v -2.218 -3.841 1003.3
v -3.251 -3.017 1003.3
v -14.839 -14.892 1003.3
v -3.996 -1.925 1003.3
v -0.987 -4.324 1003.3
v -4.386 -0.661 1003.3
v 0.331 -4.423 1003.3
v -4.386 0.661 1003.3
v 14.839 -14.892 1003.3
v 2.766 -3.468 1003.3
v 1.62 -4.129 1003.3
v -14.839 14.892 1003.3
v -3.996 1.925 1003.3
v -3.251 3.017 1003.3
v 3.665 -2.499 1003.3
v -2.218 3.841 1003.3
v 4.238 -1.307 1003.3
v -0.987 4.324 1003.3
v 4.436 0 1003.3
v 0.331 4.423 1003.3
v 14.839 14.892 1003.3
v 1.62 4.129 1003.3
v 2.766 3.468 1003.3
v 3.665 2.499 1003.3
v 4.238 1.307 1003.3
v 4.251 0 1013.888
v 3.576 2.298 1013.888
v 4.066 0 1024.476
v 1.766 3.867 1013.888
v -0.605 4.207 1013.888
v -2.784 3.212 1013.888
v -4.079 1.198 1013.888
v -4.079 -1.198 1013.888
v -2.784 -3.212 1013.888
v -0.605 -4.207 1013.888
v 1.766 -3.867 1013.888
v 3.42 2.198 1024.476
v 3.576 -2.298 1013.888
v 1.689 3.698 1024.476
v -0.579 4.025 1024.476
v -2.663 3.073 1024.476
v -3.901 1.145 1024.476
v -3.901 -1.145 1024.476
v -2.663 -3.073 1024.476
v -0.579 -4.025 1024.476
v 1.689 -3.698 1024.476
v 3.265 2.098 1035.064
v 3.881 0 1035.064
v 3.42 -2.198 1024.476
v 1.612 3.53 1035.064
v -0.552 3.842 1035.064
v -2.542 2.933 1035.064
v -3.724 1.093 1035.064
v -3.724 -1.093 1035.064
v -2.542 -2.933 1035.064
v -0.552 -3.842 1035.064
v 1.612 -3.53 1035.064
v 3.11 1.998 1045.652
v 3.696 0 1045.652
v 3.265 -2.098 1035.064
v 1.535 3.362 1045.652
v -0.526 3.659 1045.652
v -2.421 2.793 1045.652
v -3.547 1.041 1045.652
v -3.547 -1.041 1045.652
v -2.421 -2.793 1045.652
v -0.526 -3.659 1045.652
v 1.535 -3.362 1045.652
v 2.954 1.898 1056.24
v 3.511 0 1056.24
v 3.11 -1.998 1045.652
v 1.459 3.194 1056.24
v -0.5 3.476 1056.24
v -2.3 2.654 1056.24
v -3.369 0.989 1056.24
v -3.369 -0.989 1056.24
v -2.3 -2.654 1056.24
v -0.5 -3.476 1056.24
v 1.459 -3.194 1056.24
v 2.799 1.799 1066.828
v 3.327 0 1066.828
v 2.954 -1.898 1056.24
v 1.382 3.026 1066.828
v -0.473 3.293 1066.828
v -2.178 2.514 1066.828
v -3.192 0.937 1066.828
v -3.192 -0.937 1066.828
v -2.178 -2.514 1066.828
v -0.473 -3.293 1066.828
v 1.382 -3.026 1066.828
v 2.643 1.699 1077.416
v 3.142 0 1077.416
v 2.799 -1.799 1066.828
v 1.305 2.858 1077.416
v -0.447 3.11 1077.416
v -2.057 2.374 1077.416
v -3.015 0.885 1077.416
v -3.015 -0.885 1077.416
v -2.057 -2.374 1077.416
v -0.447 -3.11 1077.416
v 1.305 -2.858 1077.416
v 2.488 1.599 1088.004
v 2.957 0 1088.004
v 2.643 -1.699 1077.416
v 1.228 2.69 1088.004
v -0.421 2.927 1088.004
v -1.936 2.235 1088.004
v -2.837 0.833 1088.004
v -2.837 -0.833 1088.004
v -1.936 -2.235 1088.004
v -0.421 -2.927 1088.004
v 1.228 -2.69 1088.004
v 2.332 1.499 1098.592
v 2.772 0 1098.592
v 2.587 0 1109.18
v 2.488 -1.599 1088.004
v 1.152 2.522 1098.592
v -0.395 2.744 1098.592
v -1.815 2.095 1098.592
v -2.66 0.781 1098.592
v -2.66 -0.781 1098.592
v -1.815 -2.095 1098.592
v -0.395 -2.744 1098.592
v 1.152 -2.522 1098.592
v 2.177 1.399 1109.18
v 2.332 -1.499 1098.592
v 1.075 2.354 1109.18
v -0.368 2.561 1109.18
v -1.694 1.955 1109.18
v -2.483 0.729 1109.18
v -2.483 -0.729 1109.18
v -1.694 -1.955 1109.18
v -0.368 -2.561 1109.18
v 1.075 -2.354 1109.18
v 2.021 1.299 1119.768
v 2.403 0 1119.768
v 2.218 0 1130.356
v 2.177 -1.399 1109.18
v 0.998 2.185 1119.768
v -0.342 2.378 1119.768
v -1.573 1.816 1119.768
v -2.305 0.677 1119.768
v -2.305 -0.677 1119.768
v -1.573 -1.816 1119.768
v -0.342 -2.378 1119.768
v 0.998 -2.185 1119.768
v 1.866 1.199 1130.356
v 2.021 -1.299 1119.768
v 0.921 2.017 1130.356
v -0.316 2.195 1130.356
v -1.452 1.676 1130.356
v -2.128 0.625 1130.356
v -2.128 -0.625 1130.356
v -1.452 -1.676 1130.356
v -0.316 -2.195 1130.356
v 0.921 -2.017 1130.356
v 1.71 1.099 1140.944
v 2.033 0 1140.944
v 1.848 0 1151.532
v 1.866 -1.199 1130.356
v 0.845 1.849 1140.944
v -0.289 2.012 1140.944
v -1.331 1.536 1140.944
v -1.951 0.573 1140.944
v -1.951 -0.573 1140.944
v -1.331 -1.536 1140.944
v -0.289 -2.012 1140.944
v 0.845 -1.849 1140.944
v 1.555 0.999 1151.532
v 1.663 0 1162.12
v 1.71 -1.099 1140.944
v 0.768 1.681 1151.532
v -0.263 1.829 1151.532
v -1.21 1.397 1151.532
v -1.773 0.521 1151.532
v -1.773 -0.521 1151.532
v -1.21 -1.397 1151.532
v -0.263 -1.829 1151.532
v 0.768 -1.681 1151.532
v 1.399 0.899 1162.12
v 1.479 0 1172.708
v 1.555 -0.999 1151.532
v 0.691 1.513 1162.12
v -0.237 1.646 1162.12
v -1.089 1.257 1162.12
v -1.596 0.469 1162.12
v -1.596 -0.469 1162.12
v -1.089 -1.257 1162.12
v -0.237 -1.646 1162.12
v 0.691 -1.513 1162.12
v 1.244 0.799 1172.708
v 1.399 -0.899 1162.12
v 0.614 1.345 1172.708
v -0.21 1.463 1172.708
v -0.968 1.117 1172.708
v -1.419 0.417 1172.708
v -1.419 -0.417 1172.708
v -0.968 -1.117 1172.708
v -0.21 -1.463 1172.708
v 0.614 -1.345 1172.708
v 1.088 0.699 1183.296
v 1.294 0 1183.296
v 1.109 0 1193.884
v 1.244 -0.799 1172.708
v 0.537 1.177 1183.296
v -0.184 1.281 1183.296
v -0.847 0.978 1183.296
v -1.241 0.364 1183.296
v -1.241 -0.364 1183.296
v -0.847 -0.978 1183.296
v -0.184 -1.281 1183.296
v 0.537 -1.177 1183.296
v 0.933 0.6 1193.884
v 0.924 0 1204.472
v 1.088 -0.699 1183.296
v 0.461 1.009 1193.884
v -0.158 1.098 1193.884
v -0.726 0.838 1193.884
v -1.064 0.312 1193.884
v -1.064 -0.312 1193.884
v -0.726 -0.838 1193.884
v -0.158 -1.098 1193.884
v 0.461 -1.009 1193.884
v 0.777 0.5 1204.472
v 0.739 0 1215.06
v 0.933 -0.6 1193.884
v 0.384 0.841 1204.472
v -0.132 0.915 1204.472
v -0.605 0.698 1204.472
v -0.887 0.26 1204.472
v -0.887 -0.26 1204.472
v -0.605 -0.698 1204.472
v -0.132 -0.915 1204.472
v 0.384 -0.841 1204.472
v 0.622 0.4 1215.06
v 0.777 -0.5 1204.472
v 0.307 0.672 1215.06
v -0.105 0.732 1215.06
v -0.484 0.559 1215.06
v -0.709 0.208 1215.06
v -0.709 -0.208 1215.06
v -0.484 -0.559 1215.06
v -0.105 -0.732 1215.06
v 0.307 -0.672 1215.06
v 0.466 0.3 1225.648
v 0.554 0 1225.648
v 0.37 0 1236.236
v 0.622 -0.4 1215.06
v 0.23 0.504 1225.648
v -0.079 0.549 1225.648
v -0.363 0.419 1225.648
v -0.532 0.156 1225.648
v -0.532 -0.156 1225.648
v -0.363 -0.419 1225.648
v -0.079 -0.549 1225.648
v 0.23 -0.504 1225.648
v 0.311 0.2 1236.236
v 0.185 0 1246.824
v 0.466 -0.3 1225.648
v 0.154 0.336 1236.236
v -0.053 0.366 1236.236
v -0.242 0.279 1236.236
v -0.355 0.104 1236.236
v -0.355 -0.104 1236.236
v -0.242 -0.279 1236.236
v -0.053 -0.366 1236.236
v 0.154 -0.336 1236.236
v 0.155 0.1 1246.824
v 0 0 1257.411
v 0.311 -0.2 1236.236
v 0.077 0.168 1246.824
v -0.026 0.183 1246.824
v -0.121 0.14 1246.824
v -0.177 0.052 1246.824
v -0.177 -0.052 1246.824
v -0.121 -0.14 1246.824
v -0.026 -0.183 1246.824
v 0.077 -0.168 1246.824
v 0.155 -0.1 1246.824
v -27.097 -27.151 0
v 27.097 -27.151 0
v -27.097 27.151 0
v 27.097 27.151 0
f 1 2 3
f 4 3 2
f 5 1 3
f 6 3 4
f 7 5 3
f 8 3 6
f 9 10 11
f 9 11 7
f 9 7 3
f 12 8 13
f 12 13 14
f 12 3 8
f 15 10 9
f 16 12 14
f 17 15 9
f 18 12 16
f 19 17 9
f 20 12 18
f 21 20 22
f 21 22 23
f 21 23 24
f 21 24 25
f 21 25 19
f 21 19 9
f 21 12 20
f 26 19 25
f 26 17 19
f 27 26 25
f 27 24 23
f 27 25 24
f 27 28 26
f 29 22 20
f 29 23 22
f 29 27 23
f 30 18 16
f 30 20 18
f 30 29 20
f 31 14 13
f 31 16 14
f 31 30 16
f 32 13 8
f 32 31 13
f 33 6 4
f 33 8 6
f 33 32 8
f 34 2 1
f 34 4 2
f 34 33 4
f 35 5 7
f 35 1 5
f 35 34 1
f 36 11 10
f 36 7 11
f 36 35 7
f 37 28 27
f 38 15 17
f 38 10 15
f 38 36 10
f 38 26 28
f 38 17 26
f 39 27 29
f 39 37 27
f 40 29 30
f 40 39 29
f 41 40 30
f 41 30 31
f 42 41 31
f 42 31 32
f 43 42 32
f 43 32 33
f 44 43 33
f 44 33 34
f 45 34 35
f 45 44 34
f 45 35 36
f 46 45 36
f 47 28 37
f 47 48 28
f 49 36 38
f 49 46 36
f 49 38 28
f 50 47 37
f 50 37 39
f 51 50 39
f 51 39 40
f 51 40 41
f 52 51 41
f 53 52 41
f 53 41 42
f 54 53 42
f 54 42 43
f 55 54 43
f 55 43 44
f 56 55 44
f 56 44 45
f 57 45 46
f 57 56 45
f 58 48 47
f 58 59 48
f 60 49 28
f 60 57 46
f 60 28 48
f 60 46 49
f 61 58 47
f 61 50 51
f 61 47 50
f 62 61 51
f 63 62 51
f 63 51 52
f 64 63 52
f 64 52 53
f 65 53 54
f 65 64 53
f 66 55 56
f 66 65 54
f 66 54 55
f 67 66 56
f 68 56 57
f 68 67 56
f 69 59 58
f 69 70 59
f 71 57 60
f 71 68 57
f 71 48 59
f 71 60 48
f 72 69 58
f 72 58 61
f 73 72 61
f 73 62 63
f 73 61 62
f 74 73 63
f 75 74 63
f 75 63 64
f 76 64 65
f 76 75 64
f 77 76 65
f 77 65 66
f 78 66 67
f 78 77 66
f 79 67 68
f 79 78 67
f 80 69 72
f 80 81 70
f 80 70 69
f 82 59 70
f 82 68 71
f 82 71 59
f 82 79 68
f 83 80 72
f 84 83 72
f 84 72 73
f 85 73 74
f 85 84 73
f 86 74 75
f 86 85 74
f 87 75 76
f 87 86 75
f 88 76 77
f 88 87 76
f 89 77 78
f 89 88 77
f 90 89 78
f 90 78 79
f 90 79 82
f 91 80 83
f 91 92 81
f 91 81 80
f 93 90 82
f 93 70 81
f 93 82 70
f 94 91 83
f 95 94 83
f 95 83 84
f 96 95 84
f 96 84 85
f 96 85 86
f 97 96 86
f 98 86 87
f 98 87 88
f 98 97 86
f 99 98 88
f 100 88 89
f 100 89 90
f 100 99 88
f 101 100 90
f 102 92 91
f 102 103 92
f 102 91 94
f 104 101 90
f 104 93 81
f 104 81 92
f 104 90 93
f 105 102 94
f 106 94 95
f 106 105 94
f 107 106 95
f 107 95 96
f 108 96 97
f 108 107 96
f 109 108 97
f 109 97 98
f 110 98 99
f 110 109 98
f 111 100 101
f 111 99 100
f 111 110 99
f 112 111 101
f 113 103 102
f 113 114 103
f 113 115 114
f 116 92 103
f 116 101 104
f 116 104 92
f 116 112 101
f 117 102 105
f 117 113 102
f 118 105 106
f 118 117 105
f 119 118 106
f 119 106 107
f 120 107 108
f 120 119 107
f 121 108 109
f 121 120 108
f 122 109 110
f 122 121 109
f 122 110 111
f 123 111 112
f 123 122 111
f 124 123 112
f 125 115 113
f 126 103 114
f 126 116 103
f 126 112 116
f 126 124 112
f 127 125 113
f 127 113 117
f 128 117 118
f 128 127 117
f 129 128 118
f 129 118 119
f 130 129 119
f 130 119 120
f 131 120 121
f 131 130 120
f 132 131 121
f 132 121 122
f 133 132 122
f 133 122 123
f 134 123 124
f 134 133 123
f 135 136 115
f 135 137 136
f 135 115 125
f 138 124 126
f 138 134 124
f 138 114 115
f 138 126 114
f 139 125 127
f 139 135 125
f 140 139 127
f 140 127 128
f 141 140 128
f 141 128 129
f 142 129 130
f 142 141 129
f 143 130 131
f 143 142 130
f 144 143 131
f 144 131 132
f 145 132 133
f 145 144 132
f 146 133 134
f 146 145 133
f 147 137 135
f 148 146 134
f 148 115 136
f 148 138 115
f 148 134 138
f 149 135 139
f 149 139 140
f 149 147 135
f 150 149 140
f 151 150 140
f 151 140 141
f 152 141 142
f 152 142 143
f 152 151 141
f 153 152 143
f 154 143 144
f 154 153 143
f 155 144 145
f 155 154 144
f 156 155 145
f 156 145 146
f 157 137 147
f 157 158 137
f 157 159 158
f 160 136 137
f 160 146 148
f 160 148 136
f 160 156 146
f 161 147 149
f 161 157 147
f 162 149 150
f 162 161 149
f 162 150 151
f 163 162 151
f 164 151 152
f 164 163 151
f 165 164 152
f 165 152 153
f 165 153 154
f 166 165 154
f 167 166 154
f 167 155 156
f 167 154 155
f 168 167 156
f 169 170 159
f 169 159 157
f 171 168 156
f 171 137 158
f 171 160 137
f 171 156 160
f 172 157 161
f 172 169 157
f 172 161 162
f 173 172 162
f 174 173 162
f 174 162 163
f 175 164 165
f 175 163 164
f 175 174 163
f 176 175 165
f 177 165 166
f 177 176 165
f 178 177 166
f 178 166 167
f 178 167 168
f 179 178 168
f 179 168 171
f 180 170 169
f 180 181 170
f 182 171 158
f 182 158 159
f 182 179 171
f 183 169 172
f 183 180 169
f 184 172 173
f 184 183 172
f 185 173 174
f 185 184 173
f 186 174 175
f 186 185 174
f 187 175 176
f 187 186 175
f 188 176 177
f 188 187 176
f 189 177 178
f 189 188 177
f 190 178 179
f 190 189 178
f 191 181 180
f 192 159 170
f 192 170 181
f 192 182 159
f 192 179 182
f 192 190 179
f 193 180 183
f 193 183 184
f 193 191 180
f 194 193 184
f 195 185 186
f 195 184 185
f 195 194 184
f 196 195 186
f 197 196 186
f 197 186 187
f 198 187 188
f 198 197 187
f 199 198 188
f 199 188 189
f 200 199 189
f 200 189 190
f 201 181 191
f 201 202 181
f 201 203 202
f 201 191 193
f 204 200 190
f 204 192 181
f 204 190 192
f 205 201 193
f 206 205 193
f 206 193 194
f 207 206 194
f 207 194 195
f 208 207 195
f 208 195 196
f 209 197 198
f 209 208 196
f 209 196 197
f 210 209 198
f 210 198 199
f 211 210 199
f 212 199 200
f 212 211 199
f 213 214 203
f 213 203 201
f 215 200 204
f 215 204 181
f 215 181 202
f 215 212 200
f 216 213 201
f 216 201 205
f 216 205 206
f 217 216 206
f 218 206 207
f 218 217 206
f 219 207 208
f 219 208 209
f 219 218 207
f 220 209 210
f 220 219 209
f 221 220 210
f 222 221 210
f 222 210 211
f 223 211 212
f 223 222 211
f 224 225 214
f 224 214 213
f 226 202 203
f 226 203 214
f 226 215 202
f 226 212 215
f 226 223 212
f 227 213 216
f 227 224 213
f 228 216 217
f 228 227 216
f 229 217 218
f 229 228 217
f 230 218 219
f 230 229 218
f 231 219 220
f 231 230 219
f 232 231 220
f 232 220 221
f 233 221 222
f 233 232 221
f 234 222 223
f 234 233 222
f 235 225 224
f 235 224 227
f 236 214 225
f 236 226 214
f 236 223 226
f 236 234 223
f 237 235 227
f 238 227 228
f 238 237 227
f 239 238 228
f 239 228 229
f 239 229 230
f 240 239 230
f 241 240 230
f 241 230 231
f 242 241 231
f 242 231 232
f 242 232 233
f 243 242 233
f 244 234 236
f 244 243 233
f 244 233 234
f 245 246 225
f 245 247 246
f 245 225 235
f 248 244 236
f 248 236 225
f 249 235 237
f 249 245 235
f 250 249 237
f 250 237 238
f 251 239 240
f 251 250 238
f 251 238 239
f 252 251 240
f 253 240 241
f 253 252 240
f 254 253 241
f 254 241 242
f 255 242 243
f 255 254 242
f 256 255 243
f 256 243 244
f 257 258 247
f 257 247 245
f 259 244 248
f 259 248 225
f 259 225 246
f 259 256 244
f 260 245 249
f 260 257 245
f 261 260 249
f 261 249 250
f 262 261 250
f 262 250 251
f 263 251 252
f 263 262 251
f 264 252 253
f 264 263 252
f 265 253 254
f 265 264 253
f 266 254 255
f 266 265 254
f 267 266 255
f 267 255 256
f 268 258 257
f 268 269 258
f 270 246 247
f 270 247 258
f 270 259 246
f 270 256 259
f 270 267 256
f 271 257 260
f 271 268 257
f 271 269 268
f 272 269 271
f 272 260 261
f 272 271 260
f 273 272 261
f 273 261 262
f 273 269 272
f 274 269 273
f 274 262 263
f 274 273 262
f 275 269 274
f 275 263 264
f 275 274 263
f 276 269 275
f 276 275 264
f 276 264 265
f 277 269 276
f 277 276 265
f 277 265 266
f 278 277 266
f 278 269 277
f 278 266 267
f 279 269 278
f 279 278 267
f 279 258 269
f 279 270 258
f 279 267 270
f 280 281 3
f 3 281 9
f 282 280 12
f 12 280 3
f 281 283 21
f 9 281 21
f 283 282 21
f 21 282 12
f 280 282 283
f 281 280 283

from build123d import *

# Parameters (mm, degrees)
F0_W     = 54.1937425733
F0_H     = 54.301276803
F1_DEPTH = 1003.3
F1_TAPER = 0.7
F2_R     = 4.4355326491
F3_DEPTH = 630.428
F3_TAPER = 1


# Not quite as in the source:
# - a feature names something its author has since deleted; it is built from what else it names


with BuildPart() as f1:
    # F0 (on Top) → F1 (new body)
    with BuildSketch(Plane.XY):
        Rectangle(F0_W, F0_H)
    extrude(amount=F1_DEPTH, taper=F1_TAPER)

    # F2 (on face) → F3 (join)
    with BuildSketch(Plane.XY.offset(1003.3)):
        Circle(F2_R)
    extrude(amount=F3_DEPTH, taper=F3_TAPER)


solid = f1.part
